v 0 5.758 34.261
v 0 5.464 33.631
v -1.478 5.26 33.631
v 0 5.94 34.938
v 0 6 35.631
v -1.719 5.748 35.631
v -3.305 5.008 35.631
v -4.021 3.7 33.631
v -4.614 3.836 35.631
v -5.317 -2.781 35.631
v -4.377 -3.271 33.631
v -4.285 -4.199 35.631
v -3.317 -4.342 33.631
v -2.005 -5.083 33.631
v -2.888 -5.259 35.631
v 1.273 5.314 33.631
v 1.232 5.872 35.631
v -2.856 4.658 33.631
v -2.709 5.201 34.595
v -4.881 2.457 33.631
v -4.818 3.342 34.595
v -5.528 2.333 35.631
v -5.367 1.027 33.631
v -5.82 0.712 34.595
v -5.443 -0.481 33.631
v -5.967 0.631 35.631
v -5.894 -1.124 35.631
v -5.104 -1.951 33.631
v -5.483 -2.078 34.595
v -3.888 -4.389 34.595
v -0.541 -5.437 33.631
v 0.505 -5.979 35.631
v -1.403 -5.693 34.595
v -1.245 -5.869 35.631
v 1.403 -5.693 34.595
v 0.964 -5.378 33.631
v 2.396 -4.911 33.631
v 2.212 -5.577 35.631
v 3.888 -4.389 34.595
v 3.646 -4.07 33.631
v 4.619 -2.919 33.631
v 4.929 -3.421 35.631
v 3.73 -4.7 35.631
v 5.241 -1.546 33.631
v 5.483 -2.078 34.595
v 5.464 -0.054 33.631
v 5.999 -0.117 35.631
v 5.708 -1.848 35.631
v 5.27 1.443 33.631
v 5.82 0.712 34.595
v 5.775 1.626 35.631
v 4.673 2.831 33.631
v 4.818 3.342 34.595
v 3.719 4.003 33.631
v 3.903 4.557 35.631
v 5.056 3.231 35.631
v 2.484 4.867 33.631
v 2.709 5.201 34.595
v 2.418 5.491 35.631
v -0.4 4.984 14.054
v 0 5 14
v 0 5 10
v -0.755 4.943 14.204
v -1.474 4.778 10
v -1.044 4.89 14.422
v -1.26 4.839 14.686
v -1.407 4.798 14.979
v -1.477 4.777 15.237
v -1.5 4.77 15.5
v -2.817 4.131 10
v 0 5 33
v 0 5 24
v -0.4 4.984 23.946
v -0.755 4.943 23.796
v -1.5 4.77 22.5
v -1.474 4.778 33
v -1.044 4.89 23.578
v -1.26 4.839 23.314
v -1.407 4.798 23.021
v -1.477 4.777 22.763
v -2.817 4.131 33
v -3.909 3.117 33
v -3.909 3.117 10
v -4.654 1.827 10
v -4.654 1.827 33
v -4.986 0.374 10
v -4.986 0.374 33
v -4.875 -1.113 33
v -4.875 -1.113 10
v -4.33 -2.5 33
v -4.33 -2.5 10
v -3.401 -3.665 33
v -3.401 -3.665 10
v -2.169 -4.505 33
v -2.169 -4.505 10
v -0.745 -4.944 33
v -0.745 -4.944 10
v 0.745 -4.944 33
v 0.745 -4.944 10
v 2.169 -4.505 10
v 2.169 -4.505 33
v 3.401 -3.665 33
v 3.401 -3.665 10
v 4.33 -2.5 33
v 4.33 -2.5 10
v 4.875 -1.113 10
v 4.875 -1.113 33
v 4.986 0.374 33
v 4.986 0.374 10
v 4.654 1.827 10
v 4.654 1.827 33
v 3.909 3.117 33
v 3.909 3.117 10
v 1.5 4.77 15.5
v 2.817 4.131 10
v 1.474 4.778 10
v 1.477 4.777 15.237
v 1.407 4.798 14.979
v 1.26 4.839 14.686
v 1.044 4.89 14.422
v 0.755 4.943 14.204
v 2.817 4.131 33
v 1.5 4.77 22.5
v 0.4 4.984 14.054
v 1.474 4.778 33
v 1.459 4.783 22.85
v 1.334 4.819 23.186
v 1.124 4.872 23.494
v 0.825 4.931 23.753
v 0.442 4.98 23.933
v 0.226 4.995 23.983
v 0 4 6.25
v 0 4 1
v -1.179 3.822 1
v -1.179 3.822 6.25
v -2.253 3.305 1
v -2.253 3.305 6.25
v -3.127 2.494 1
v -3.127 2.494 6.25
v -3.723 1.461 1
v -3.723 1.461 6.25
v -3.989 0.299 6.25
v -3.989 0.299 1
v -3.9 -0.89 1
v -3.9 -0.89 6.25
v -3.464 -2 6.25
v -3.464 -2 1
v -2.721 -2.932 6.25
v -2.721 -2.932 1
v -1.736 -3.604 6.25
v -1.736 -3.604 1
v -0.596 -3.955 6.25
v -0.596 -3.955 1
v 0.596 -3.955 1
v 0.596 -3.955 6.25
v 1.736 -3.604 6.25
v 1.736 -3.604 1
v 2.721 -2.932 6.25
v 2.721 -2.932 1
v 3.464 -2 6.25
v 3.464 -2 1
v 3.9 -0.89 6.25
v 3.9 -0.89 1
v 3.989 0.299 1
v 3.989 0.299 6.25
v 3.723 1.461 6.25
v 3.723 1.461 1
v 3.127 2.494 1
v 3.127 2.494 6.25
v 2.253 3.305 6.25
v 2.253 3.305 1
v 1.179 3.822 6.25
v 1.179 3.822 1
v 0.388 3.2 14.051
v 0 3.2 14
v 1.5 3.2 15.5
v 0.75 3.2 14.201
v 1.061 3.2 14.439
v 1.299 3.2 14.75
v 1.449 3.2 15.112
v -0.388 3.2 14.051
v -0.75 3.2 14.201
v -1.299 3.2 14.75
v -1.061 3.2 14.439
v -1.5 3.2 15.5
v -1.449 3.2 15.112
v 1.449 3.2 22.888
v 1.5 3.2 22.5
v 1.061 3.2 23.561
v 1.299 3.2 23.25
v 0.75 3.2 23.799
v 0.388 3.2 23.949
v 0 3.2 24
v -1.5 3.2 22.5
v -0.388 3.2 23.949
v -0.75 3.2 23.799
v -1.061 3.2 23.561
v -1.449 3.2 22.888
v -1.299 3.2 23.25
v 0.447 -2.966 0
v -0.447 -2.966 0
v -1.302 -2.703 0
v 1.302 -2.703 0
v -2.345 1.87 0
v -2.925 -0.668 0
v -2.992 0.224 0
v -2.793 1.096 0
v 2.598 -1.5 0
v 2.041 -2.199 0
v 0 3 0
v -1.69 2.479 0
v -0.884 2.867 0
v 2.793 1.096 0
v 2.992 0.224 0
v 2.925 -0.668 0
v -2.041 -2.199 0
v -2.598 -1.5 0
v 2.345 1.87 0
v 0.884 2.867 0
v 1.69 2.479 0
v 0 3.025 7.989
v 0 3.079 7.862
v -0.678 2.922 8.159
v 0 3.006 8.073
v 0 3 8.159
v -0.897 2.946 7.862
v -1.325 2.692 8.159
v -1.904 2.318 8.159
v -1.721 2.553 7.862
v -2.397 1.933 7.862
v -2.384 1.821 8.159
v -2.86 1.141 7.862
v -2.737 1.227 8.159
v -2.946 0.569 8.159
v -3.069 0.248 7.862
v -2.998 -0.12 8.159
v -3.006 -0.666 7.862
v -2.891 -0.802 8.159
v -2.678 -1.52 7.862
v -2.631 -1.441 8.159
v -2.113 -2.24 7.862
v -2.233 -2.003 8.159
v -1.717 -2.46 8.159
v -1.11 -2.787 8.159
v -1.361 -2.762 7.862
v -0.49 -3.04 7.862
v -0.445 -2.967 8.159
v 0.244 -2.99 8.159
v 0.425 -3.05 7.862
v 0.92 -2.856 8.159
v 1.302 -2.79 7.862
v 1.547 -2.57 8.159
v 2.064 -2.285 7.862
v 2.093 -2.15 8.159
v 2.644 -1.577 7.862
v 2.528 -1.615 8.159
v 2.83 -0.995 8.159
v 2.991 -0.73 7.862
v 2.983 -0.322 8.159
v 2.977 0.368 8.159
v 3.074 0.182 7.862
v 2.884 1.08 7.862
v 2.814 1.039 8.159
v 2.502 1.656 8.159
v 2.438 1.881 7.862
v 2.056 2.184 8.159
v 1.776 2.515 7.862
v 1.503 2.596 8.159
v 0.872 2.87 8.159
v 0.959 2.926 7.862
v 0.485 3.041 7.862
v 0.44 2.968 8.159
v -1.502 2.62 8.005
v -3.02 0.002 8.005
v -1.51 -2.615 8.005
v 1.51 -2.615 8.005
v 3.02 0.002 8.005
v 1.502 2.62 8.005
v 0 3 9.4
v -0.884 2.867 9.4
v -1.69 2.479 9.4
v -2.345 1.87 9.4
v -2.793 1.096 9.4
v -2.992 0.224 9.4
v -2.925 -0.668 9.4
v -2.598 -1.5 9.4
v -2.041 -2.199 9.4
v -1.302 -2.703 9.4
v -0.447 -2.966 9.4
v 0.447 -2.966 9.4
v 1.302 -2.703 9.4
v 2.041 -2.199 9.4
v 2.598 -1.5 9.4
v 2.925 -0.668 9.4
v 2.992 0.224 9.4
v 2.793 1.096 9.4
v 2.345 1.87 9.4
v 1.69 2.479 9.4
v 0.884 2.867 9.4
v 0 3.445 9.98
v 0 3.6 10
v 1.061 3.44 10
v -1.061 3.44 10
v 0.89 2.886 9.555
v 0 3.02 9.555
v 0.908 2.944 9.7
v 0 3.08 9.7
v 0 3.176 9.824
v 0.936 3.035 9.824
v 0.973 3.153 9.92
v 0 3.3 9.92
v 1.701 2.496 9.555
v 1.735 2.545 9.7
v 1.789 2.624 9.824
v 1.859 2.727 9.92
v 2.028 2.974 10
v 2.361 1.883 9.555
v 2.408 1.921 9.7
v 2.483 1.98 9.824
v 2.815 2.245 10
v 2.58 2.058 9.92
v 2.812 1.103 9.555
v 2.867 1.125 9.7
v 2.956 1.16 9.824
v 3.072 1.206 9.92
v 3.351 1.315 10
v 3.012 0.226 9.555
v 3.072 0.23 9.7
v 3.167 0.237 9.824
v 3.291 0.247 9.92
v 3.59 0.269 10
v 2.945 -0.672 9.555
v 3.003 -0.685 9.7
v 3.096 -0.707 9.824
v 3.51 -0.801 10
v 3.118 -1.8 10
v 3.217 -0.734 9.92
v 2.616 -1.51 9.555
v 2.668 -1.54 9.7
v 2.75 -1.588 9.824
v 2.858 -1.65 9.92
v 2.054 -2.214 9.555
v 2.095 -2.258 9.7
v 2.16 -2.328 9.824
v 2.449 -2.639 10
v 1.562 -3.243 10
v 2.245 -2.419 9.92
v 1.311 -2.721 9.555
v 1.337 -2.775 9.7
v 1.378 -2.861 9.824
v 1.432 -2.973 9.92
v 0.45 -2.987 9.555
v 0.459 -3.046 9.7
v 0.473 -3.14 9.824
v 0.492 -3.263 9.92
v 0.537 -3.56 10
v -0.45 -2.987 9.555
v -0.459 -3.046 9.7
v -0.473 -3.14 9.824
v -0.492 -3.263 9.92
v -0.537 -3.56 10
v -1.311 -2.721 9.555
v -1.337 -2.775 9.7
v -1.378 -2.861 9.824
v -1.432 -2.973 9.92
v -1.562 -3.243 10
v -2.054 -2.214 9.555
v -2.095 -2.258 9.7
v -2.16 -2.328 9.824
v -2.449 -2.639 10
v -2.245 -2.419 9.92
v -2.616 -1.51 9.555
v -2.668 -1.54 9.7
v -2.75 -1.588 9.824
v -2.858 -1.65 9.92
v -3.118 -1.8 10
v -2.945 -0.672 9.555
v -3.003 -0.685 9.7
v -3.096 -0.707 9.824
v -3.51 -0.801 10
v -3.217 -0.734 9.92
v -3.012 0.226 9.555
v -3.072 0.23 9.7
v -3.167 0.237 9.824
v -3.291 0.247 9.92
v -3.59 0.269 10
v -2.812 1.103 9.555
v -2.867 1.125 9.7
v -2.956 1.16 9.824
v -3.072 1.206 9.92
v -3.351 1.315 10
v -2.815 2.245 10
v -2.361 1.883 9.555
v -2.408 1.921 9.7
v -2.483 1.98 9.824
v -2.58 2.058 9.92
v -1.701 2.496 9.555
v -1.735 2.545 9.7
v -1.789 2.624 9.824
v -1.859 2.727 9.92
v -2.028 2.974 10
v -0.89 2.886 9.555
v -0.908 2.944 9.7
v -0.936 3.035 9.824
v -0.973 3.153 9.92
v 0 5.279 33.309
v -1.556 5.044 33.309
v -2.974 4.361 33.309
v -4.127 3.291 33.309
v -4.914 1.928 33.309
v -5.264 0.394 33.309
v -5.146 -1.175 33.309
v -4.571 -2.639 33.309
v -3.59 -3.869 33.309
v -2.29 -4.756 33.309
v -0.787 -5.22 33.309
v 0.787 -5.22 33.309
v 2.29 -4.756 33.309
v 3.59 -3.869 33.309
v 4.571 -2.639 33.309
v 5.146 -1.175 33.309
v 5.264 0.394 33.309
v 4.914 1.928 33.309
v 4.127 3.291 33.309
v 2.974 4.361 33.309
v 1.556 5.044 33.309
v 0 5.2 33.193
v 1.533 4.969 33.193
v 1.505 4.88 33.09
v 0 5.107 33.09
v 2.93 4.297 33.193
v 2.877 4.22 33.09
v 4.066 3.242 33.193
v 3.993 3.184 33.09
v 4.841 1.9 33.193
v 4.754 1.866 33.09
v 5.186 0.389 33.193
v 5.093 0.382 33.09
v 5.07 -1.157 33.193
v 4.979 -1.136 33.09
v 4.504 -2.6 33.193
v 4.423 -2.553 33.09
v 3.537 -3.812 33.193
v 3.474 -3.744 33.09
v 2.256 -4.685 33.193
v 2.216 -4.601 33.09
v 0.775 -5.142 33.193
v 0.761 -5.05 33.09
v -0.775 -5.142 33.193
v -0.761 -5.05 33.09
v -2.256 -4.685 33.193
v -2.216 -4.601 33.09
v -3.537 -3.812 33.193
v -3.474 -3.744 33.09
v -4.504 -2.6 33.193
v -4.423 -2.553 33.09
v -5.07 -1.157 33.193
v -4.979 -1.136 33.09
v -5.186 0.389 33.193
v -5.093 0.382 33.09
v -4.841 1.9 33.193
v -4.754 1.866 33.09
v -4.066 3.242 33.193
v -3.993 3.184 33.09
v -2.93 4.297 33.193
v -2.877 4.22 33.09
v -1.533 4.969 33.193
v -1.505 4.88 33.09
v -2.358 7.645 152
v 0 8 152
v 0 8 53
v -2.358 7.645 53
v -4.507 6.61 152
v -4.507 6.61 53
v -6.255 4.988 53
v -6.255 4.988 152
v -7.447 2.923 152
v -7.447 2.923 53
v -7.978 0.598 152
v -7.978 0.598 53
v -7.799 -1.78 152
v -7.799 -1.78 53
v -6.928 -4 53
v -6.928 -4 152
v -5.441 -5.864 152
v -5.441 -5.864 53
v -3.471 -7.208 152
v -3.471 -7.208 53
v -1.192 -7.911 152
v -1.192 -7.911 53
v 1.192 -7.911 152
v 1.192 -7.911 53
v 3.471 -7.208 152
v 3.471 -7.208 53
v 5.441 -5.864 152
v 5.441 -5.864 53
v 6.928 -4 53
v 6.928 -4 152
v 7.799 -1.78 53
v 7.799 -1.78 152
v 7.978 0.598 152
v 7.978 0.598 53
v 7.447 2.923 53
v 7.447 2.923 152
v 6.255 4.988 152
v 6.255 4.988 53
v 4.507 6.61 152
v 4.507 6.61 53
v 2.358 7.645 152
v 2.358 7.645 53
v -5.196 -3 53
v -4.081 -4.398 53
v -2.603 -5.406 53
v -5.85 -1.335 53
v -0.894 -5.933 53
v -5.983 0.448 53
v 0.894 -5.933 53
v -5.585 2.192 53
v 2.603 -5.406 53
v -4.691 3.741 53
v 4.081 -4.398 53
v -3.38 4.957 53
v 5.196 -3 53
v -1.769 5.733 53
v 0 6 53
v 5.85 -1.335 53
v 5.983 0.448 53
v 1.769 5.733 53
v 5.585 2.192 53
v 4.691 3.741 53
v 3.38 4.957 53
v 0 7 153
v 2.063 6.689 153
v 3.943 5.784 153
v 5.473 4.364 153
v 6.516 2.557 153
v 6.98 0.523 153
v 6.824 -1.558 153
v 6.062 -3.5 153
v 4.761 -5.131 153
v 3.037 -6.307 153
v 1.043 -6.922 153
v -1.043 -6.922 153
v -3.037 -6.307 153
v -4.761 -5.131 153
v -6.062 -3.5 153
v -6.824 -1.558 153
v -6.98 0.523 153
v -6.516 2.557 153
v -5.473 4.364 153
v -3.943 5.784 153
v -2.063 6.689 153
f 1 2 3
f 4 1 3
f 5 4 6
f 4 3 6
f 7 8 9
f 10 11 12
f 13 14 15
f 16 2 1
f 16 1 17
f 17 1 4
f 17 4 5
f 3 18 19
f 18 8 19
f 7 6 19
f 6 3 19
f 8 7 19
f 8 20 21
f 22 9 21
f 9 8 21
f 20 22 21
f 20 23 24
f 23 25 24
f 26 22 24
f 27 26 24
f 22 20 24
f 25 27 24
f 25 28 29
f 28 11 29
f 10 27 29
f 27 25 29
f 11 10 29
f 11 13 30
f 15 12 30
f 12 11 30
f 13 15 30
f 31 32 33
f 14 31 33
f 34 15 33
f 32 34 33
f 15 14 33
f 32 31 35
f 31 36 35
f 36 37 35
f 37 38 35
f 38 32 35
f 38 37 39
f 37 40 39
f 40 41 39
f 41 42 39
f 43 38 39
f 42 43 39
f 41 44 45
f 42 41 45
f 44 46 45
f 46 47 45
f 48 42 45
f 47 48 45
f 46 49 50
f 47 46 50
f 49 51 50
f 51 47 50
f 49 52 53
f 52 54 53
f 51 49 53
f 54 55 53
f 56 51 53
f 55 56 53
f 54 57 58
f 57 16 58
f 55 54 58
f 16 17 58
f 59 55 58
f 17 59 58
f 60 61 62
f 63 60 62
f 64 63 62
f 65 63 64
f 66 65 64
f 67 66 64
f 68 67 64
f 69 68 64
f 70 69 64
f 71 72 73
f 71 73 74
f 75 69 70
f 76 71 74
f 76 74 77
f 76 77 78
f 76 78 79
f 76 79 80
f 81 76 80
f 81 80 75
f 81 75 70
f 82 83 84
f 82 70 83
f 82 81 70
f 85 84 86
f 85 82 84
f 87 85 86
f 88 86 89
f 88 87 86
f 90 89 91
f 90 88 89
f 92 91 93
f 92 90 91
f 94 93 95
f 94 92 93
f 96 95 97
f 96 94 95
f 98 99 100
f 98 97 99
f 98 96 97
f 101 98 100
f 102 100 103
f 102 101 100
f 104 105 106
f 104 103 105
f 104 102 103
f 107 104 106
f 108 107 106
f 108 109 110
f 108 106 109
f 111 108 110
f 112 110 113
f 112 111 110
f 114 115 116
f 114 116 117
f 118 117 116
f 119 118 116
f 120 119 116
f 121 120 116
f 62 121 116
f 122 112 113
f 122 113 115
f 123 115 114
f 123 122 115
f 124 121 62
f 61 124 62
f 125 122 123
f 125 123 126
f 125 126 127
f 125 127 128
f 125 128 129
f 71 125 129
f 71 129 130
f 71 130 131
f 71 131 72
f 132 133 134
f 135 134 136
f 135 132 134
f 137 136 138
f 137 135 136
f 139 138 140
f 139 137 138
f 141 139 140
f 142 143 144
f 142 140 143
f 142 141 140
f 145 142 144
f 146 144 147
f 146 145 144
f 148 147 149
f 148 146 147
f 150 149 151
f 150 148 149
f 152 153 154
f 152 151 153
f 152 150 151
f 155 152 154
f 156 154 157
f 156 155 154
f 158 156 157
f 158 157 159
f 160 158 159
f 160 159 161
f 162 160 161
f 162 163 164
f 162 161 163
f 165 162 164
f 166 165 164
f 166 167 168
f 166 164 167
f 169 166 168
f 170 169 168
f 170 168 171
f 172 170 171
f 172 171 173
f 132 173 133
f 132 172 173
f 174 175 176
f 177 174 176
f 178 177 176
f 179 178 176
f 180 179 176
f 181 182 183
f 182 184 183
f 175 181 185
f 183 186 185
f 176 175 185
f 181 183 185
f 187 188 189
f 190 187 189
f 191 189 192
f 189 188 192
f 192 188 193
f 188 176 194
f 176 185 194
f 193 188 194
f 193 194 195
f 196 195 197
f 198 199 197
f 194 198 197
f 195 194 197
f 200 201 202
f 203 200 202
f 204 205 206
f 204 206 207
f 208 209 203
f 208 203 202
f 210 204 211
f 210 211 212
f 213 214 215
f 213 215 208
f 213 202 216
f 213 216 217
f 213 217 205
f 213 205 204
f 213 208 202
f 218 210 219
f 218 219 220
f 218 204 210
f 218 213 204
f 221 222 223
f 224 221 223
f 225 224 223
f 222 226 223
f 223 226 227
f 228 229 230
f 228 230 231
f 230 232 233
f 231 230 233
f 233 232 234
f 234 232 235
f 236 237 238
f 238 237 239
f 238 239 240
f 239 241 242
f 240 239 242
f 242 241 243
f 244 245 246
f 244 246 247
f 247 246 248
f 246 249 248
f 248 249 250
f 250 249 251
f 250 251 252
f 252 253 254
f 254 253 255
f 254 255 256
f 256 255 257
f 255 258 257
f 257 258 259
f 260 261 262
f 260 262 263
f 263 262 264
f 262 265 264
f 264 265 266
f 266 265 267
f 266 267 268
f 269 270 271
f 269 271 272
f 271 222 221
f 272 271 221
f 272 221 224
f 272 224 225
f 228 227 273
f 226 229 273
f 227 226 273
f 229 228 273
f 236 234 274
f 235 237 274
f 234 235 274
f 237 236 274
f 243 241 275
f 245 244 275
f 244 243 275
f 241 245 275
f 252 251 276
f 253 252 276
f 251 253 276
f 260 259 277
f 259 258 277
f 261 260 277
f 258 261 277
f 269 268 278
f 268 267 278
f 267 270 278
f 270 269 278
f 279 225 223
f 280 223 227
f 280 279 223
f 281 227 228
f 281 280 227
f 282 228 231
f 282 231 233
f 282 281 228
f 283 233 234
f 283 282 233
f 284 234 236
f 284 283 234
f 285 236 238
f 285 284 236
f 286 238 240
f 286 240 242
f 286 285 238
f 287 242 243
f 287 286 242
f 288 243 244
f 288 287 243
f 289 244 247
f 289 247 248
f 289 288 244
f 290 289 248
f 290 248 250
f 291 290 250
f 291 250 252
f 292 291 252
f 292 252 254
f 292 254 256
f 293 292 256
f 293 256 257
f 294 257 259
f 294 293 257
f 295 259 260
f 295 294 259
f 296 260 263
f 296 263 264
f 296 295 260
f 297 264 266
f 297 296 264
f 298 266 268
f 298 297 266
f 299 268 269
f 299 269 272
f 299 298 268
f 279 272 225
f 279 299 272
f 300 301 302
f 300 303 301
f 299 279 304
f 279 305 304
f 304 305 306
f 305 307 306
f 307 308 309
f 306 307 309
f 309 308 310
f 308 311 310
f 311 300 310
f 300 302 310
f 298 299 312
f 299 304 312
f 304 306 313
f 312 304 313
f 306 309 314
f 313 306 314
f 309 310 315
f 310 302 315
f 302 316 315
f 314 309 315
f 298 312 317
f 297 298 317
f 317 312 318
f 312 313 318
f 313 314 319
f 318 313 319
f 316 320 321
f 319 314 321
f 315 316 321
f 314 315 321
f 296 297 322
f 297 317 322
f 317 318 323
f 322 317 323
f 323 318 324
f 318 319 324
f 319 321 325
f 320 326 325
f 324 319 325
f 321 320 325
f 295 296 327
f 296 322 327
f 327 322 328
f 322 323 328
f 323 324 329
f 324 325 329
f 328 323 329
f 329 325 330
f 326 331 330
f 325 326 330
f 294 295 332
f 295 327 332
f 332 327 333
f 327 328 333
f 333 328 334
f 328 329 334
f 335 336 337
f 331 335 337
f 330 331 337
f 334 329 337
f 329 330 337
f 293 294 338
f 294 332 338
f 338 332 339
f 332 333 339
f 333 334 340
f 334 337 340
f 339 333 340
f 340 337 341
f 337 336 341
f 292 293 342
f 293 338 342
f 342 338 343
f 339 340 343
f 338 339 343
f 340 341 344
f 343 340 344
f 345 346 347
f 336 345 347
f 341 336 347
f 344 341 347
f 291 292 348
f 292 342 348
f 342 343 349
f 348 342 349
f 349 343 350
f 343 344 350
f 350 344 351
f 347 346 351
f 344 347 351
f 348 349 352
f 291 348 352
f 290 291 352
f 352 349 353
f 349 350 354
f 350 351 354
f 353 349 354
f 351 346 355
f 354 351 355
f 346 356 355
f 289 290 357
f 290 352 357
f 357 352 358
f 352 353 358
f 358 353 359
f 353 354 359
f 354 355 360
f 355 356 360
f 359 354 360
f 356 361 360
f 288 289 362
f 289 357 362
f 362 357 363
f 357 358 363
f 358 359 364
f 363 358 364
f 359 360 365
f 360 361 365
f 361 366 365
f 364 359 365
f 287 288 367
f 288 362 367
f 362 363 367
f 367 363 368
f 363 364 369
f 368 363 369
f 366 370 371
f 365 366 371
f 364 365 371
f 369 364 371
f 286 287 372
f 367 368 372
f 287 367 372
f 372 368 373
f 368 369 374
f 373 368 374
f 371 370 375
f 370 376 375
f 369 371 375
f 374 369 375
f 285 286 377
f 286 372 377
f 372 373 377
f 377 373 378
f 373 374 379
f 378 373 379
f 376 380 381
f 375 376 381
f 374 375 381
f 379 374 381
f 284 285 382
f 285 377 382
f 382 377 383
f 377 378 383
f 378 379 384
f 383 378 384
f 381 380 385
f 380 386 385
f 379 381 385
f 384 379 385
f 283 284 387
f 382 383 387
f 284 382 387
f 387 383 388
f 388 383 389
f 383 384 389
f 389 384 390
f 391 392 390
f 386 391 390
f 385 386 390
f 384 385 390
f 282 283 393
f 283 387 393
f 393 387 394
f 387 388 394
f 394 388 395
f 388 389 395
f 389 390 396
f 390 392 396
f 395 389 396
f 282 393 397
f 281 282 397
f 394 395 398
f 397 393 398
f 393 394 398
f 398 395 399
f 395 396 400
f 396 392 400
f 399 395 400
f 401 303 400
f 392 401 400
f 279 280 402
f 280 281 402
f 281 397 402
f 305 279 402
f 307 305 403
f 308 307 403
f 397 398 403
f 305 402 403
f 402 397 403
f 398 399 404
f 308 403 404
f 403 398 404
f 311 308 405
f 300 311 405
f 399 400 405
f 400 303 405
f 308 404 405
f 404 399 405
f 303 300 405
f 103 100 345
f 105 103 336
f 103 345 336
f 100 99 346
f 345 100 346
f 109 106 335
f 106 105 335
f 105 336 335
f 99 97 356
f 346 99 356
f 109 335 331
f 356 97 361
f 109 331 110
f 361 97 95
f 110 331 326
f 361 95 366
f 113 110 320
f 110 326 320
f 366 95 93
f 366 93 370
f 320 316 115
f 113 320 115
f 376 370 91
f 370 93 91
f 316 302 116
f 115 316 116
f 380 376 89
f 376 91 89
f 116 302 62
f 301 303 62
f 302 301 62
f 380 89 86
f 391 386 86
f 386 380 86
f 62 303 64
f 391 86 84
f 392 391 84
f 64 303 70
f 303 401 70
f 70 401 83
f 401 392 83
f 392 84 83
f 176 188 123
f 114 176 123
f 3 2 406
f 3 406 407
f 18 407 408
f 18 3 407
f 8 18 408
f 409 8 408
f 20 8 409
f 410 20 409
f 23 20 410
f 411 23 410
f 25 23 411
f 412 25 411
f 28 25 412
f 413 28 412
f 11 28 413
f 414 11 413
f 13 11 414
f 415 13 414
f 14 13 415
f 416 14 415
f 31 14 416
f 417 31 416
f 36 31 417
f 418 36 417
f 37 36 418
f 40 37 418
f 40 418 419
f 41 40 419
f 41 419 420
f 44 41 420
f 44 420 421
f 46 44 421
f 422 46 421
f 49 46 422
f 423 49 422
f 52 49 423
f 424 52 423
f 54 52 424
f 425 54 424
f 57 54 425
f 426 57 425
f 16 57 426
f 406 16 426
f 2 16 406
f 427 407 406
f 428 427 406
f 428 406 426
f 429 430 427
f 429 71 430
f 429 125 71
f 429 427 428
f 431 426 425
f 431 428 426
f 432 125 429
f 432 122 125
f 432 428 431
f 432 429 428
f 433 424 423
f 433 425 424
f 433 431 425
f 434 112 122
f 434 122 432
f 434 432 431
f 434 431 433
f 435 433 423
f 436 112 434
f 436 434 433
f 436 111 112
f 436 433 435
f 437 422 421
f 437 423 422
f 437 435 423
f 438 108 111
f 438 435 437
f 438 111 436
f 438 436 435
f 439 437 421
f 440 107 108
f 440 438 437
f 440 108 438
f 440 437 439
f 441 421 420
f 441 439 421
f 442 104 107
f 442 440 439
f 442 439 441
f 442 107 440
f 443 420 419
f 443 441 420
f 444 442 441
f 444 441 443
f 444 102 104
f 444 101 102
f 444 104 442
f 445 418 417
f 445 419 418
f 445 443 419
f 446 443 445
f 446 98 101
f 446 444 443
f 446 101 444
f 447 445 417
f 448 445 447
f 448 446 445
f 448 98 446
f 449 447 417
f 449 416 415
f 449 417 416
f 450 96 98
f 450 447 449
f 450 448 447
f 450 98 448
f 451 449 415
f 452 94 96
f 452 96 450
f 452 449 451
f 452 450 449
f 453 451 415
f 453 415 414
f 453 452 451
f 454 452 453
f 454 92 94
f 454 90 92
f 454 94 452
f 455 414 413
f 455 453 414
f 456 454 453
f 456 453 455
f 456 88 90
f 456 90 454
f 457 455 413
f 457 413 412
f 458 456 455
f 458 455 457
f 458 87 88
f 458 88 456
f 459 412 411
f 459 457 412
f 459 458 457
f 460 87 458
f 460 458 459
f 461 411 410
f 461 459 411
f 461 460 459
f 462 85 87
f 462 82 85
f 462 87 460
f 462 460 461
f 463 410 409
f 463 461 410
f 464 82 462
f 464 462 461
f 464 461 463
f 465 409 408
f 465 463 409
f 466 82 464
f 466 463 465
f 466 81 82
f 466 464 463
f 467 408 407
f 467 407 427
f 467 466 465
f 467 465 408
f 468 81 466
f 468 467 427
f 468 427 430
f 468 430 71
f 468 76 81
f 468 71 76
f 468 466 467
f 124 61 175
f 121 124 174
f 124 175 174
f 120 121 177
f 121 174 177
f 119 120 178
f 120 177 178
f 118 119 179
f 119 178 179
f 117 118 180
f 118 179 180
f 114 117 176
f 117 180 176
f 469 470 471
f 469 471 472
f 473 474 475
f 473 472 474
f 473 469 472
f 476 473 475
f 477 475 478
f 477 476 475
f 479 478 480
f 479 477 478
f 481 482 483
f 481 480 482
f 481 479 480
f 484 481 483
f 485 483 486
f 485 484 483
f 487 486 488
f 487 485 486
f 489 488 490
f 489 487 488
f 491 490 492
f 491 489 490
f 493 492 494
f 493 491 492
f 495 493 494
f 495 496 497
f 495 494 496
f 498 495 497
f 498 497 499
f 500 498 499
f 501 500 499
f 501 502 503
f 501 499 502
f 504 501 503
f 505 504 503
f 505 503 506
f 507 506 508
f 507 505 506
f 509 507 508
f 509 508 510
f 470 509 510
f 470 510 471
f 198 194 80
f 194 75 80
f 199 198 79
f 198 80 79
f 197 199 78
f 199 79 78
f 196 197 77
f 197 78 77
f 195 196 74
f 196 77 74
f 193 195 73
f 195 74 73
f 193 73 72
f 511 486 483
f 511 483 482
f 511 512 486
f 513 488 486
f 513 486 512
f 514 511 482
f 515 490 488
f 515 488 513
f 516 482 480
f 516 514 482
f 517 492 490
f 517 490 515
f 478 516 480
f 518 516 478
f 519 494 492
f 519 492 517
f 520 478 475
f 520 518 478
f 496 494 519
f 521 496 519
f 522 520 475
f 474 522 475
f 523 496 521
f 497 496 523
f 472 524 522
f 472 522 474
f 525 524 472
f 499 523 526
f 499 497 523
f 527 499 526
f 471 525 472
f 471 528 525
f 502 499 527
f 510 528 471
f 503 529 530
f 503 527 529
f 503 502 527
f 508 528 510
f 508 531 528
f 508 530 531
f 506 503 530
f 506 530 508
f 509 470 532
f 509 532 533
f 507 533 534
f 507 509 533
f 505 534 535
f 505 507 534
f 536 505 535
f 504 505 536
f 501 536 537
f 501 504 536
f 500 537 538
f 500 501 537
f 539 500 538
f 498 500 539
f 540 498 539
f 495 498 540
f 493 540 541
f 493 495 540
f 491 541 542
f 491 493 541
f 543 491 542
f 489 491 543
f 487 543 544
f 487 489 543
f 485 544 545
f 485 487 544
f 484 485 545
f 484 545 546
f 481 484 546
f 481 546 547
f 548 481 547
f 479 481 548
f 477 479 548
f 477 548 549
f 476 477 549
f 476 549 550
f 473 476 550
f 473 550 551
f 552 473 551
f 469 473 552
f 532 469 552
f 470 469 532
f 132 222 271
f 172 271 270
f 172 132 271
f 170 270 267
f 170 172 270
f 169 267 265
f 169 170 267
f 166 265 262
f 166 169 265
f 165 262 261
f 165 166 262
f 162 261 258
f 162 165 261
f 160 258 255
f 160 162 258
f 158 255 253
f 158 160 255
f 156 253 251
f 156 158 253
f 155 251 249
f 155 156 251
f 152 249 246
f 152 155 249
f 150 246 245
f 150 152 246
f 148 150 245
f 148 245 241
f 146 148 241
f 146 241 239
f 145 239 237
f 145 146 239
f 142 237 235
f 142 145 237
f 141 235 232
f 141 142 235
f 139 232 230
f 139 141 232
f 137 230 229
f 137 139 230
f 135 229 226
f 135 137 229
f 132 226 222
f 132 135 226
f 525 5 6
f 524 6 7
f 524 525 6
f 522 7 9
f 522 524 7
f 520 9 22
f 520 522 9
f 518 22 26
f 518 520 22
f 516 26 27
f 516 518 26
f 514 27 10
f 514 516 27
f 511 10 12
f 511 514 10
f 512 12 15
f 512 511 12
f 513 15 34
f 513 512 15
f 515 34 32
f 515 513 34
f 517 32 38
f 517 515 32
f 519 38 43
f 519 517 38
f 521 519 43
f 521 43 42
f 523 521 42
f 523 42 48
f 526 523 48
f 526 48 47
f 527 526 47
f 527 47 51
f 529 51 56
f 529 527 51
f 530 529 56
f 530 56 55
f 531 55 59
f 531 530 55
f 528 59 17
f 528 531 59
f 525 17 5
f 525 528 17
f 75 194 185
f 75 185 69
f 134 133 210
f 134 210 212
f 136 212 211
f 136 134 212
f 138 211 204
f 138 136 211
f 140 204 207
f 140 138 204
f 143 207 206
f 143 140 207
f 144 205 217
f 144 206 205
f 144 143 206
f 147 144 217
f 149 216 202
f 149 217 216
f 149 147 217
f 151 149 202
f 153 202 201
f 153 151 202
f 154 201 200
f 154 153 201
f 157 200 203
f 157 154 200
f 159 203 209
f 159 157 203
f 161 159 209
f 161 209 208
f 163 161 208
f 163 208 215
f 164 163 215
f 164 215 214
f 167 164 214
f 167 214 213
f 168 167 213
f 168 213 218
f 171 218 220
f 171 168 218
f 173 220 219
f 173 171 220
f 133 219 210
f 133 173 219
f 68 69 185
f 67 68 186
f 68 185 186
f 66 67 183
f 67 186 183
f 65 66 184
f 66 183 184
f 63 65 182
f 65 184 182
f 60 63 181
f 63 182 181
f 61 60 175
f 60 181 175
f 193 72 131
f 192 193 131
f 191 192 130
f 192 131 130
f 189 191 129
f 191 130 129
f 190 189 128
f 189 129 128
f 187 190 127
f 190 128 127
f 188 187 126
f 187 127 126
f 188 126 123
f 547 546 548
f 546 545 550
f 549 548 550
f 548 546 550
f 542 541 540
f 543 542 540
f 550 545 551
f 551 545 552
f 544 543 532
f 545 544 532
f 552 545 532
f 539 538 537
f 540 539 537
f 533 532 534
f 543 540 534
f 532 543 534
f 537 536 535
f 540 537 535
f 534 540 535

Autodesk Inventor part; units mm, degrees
ref_plane "YZ Plane" through (0, 0, 0) normal (1, 0, 0) x (0, 1, 0)
ref_plane "XZ Plane" through (0, 0, 0) normal (0, 1, 0) x (-1, 0, 0)
ref_plane "XY Plane" through (0, 0, 0) normal (0, 0, 1) x (1, 0, 0)
sketch "스케치1" plane through (0, 0, 0) normal (1, 0, 0) x (0, 1, 0)
  line L0 (0, 0) -> (4, 0)
  line L1 (4, 0) -> (4, 10)
  line L2 (4, 10) -> (0, 10)
  line L3 (0, 10) -> (0, 0)
  line L4 (0, 10) -> (5, 10)
  line L5 (5, 10) -> (5, 33)
  line L6 (5, 33) -> (0, 33)
  line L7 (0, 33) -> (0, 10)
  line L8 (0, 33) -> (6, 33)
  line L9 (6, 33) -> (6, 53)
  line L10 (6, 53) -> (0, 53)
  line L11 (0, 53) -> (0, 33)
  line L12 (0, 53) -> (8, 53)
  line L13 (8, 53) -> (8, 153)
  line L14 (8, 153) -> (0, 153)
  line L15 (0, 153) -> (0, 53)
  dimension "d0" = 100
  dimension "d1" = 20
  dimension "d2" = 23
  dimension "d3" = 10
  dimension "d4" = 8
  dimension "d5" = 10
  dimension "d6" = 12
  dimension "d7" = 16
revolve "회전1" add sketch "스케치1" angle 360 about axis through (0, 0, 33) along (0, 0, -1)
thread "스레드1" size "M8x1.25" class "6g" standard "ANSI Metric M Profile" full length
sketch "스케치2" plane through (0, 0, 0) normal (1, 0, 0) x (0, 1, 0)
  line L0 (6, 53) -> (6, 33) projected
  line L1 (-6, 33) -> (6, 33) projected
  line L2 (6, 33) -> (6, 34.5588)
  line L3 (6, 33) -> (5.1, 33)
  line L4 (5.1, 33) -> (6, 34.5588)
  line L5 (0, -30.6) -> (0, 183.6) projected
  point P0 (0, 0)
  dimension "d11" = 0.9
  dimension "d12" = 30
revolve "회전2" cut sketch "스케치2" angle 360 about axis through (0, 0, -10) along (0, 0, 1)
fillet "모깎기1" radius 4 1 edges at (0, -6, 34.5588)
fillet "모깎기2" radius 1 1 edges at (0, -5.1, 33)
sketch "스케치3" plane through (0, 0, 0) normal (1, 0, 0) x (0, 1, 0)
  line L0 (5, 33) -> (5, 10) projected
  line L1 (5, 14) -> (3.2, 14)
  line L2 (3.2, 14) -> (3.2, 24)
  line L3 (3.2, 24) -> (5, 24)
  line L4 (5, 24) -> (5, 14)
  point P0 (0, 0)
  dimension "d16" = 1.8
  dimension "d17" = 10
  dimension "d18" = 4
extrude "돌출1" cut sketch "스케치3" along normal mid plane 3
fillet "모깎기3" radius 1.5 4 edges at (1.5, 3.9848, 14) (-1.5, 3.9848, 14) (-1.5, 3.9848, 24) (1.5, 3.9848, 24)
chamfer "모따기1" distance 1 angle 45 2 edges at (0, -8, 153) (0, -4, 0)
sketch "스케치4" plane through (0, 0, 0) normal (1, 0, 0) x (0, 1, 0)
  line L0 (4, 10) -> (4, 6.25)
  line L1 (4, 6.25) -> (3, 8)
  line L2 (3, 8) -> (3, 10)
  line L3 (3, 10) -> (4, 10)
  line L4 (-5, 10) -> (5, 10) projected
  line L5 (0, -30.6) -> (0, 183.6) projected
  point P0 (0, 0)
  dimension "d25" = 1
  dimension "d26" = 2
  dimension "d27" = 3.75
revolve "회전3" cut sketch "스케치4" angle 360 about axis through (0, 0, -10) along (0, 0, 1)
fillet "모깎기4" radius 0.6 2 edges at (0, -3, 8) (0, -3, 10)
properties part number "도면1-2번"
